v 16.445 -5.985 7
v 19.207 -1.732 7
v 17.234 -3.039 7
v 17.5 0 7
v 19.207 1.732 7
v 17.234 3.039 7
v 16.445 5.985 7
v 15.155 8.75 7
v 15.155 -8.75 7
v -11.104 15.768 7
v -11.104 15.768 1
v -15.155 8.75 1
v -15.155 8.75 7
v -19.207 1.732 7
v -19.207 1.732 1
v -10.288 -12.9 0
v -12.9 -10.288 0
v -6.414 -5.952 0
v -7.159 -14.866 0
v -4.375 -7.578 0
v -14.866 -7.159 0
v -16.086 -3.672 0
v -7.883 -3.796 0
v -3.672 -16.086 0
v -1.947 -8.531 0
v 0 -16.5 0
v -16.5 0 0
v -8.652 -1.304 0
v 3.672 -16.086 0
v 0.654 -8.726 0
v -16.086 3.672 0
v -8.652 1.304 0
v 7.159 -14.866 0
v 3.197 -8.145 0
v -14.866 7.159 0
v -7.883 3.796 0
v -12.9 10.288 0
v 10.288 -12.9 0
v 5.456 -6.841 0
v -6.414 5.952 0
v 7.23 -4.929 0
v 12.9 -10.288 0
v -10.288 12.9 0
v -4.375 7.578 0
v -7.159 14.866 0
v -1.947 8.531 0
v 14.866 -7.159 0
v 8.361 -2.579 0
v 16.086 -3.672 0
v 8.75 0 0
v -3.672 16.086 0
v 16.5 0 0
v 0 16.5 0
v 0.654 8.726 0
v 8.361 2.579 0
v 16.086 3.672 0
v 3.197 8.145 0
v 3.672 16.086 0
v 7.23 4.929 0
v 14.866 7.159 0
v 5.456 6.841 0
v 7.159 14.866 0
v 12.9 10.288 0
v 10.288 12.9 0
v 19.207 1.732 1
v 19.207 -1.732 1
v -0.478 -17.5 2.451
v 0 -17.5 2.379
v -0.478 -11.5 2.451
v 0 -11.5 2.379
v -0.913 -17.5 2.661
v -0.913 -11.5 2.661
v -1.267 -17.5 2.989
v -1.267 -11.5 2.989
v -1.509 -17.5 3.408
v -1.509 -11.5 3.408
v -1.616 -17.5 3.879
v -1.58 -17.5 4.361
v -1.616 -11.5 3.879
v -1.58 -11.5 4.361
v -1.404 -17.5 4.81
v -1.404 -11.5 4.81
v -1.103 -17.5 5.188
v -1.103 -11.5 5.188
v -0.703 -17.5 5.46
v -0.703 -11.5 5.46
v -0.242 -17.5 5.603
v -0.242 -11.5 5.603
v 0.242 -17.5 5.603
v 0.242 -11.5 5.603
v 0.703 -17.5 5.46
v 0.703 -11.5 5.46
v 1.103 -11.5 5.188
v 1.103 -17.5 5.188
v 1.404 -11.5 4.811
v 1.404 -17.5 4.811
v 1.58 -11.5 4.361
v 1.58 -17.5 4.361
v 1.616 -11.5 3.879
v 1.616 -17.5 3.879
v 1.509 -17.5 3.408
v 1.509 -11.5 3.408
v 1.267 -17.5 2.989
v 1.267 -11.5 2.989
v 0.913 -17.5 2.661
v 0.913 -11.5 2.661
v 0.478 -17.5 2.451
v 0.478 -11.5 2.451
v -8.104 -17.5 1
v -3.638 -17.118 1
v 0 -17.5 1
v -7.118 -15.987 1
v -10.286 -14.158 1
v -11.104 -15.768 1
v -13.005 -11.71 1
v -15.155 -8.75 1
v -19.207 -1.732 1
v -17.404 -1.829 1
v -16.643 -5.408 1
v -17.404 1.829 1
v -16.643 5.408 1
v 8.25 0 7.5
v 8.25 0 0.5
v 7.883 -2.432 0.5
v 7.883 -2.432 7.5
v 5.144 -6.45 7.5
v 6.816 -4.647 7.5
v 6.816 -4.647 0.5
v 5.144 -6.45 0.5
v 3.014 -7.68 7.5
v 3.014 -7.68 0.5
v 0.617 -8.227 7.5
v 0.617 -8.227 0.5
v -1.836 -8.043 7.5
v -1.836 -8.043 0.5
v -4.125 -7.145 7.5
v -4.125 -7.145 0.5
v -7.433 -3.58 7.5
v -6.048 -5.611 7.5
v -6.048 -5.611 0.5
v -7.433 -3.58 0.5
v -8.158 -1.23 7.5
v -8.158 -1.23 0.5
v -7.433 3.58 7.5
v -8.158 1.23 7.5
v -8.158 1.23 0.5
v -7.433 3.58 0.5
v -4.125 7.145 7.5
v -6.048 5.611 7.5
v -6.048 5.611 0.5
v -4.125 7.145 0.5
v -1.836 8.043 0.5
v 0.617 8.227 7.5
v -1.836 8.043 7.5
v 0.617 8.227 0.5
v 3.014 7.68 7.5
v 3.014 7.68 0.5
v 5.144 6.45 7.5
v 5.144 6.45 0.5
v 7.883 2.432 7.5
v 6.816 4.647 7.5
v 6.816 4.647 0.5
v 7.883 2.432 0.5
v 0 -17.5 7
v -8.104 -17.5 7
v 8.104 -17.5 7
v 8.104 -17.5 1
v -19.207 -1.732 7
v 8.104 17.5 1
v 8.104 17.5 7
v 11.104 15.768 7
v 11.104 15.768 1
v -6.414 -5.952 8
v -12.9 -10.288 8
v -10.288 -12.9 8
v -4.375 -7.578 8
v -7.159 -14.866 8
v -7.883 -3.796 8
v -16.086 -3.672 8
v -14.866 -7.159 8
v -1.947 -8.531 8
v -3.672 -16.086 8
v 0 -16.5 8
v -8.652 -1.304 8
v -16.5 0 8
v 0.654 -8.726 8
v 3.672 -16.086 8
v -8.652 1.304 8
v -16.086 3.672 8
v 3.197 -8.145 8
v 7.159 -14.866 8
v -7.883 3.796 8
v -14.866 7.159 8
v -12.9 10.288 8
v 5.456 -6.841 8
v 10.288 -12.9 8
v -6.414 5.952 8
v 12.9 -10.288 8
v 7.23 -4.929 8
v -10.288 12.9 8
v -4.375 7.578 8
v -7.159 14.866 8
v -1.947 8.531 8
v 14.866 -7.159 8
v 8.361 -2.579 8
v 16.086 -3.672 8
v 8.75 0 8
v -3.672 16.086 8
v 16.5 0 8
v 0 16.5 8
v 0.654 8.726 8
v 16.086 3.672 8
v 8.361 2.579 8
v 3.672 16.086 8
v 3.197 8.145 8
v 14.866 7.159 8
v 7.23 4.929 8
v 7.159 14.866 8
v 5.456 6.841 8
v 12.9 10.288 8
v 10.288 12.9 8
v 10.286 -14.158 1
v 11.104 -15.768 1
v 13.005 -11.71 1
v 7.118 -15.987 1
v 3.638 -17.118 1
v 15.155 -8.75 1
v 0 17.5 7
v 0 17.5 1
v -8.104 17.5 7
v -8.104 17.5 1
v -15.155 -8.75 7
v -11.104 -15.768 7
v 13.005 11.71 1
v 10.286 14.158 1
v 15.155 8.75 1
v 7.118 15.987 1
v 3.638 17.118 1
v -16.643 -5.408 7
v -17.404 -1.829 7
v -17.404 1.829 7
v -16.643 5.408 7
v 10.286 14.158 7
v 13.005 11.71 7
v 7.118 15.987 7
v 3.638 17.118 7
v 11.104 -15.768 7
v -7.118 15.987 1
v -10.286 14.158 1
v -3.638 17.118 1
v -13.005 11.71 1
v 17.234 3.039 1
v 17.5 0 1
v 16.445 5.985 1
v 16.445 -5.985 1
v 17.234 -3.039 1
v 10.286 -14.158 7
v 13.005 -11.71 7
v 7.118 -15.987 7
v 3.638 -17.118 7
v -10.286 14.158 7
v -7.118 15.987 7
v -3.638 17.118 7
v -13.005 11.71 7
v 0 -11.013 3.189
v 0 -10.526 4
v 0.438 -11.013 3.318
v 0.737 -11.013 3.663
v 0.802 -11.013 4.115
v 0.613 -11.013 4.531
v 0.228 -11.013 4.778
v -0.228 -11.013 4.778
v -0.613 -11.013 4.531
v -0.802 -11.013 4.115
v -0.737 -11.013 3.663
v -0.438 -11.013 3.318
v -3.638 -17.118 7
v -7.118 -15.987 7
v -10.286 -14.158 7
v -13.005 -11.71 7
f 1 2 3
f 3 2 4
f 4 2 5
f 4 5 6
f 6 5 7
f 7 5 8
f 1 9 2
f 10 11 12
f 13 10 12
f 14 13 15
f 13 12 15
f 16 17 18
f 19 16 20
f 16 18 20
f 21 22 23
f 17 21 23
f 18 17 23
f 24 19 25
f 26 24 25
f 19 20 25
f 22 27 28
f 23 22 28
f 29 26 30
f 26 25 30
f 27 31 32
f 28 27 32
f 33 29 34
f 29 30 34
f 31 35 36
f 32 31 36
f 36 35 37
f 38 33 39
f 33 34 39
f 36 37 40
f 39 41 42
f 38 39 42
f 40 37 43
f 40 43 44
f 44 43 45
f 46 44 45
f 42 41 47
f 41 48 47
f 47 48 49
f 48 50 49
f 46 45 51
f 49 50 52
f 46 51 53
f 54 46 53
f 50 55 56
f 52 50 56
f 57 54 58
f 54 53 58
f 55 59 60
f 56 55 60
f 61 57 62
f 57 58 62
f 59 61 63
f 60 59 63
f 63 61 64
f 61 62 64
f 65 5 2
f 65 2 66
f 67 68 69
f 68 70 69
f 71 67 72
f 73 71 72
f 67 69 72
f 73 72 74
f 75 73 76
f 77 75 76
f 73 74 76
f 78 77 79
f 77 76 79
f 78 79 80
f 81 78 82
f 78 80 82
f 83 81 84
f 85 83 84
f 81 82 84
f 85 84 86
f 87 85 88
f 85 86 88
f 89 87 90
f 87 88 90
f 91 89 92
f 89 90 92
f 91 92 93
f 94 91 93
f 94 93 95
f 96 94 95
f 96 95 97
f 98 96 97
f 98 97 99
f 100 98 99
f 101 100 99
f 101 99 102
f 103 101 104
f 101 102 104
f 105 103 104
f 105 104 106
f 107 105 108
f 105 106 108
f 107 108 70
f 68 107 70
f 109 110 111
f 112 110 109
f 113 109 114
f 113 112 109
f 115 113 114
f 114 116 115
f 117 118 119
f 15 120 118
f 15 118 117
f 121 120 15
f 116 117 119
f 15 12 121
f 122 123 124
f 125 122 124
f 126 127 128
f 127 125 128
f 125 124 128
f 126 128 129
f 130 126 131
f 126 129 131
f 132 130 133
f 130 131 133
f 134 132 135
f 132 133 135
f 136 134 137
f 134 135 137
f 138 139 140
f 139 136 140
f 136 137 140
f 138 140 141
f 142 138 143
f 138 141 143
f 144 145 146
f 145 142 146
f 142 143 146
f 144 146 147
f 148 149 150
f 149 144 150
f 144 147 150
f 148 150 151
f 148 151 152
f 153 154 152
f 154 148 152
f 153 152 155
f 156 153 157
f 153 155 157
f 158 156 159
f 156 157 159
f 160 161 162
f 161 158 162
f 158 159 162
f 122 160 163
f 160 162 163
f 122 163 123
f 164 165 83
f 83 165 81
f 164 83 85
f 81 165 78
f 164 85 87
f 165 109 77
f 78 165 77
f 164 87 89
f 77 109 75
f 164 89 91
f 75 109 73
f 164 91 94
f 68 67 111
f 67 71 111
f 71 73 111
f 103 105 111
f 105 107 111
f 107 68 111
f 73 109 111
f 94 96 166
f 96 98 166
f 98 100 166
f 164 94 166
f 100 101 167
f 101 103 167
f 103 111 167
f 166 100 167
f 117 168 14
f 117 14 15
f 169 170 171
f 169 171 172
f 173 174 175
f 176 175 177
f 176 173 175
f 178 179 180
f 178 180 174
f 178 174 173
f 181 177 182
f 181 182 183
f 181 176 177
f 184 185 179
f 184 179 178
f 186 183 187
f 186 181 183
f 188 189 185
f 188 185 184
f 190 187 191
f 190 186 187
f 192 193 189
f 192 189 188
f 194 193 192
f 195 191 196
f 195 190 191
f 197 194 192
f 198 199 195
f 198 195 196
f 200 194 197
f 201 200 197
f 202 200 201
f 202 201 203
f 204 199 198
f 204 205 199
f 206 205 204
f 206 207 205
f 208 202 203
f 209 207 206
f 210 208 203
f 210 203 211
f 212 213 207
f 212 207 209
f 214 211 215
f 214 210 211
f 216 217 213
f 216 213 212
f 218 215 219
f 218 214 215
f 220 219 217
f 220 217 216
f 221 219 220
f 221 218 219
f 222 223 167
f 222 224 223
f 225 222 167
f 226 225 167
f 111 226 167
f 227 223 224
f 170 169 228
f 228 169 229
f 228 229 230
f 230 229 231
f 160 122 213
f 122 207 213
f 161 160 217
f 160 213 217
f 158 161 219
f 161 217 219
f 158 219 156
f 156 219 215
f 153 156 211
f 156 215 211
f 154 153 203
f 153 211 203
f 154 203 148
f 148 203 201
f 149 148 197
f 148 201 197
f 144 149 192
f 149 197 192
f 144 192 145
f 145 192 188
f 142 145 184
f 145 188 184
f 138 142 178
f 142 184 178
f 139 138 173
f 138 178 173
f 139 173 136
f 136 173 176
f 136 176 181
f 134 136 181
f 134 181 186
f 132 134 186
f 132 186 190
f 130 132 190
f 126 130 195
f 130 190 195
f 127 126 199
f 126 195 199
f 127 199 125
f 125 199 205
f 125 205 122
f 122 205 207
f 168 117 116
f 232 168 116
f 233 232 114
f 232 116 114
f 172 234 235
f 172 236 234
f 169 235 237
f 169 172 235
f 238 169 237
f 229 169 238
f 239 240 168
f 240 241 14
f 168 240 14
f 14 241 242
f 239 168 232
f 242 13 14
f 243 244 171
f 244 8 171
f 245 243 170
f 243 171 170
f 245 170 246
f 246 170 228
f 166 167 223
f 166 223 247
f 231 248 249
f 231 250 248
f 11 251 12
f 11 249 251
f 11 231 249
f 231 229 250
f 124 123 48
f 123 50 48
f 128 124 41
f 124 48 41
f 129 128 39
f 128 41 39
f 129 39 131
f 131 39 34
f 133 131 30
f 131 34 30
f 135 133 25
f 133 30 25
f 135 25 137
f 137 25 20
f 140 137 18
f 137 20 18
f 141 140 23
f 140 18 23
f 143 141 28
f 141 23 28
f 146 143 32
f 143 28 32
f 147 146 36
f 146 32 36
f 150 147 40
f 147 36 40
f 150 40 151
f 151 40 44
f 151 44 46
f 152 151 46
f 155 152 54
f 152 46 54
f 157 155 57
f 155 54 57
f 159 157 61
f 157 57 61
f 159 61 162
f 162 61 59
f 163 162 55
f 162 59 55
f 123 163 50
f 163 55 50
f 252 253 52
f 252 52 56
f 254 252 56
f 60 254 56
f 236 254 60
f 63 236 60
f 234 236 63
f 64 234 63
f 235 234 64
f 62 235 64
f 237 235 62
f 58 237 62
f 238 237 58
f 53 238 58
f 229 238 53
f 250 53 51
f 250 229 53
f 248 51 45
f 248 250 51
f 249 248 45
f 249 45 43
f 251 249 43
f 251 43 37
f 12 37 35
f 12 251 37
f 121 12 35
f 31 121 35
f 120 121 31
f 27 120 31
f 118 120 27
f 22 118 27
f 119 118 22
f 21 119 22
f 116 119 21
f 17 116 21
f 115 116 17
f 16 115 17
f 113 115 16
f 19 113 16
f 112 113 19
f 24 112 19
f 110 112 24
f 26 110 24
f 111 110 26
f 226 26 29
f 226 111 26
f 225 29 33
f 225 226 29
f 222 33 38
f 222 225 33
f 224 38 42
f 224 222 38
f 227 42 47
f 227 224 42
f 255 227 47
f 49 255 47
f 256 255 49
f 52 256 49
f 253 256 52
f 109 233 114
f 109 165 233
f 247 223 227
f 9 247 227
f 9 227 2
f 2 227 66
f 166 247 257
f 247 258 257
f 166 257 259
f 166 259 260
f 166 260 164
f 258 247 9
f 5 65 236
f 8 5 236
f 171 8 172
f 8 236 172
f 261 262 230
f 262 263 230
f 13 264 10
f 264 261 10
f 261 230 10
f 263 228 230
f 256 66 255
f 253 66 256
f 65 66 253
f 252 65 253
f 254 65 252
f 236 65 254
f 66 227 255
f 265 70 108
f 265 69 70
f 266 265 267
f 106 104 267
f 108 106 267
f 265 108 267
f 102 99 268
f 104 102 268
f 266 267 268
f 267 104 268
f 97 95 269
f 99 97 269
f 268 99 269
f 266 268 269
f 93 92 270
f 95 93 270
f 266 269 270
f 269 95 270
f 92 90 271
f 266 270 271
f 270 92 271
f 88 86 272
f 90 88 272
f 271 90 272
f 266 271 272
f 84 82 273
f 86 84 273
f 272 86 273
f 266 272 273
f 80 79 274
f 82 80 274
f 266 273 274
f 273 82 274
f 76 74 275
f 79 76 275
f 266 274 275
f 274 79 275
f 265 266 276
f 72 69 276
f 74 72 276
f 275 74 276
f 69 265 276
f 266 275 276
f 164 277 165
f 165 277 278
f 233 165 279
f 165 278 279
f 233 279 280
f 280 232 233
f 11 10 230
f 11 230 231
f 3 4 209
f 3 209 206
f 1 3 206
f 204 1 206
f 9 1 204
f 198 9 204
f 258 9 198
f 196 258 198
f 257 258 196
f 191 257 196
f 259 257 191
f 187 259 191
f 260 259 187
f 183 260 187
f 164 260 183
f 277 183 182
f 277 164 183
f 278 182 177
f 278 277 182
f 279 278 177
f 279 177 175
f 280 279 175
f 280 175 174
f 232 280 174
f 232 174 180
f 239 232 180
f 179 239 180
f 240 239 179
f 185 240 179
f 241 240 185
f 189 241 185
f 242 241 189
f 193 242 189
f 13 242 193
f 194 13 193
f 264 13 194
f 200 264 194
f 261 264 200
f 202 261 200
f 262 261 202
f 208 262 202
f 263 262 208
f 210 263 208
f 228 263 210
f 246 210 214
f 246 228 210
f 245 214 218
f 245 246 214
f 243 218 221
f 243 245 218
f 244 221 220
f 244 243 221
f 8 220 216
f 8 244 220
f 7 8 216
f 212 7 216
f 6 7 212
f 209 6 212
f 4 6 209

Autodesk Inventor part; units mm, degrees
ref_plane "YZ Plane" through (0, 0, 0) normal (1, 0, 0) x (0, 1, 0)
ref_plane "XZ Plane" through (0, 0, 0) normal (0, 1, 0) x (-1, 0, 0)
sketch "Esquisse1" plane through (0, 0, 0) normal (0, 0, 1) x (1, 0, 0)
  circle A0 centre (0, 0) radius 17.5
  circle A1 centre (0, 0) radius 8.25
  dimension "d0" = 16.5
  dimension "d1" = 35
extrude "Extrusion1" add sketch "Esquisse1" along normal blind 8
chamfer "Chanfrein1" distance 0.5 angle 45 2 edges at (-8.25, 0, 0) (-8.25, 0, 8)
chamfer "Chanfrein2" distance 1 angle 45 2 edges at (-17.5, 0, 8) (-17.5, 0, 0)
ref_plane "Plan de construction1" through (0, 0, 1) normal (0, 0, -1) x (-1, 0, 0)
sketch "Esquisse3" plane through (0, 0, 1) normal (0, 0, -1) x (-1, 0, 0)
  circle A0 centre (0, 0) radius 17.5 projected
  circle A1 centre (0, 0) radius 8.25 projected
  line L0 (10.1036, 17.5) -> (20.2073, 0)
  line L1 (20.2073, 0) -> (10.1036, -17.5)
  line L2 (10.1036, -17.5) -> (-10.1036, -17.5)
  line L3 (-10.1036, -17.5) -> (-20.2073, 0)
  line L4 (-20.2073, 0) -> (-10.1036, 17.5)
  line L5 (-10.1036, 17.5) -> (10.1036, 17.5)
extrude "Extrusion2" add sketch "Esquisse3" against normal blind 6 contours A0 L0 L1 | A0 L5 L0 | L1 L2 A0 | A0 L4 L5 | L2 L3 A0 | A0 L3 L4
chamfer "Chanfrein3" distance 2 angle 45 6 edges at (10.1036, 17.5, 4) (20.2073, 0, 4) (10.1036, -17.5, 4) (-10.1036, -17.5, 4) (-20.2073, 0, 4) (-10.1036, 17.5, 4)
sketch "Esquisse4" plane through (-8.1036, -17.5, 1) normal (0, -1, 0) x (1, 0, 0)
  line L0 (16.2073, 6) -> (16.2073, 0) projected
  point P0 (8.1036, -1)
  point P1 (8.1036, 3)
  point P2 (16.2073, 3)
hole "Perçage1" at (0, -17.5, 4) direction (0, 1, 0) diameter 3.242 depth 6 tip angle 118 thread size "M4x0.7" class "6H" standard "ISO Metric profile"
properties part number "support_canon_ext" material "Aluminium 6061"
